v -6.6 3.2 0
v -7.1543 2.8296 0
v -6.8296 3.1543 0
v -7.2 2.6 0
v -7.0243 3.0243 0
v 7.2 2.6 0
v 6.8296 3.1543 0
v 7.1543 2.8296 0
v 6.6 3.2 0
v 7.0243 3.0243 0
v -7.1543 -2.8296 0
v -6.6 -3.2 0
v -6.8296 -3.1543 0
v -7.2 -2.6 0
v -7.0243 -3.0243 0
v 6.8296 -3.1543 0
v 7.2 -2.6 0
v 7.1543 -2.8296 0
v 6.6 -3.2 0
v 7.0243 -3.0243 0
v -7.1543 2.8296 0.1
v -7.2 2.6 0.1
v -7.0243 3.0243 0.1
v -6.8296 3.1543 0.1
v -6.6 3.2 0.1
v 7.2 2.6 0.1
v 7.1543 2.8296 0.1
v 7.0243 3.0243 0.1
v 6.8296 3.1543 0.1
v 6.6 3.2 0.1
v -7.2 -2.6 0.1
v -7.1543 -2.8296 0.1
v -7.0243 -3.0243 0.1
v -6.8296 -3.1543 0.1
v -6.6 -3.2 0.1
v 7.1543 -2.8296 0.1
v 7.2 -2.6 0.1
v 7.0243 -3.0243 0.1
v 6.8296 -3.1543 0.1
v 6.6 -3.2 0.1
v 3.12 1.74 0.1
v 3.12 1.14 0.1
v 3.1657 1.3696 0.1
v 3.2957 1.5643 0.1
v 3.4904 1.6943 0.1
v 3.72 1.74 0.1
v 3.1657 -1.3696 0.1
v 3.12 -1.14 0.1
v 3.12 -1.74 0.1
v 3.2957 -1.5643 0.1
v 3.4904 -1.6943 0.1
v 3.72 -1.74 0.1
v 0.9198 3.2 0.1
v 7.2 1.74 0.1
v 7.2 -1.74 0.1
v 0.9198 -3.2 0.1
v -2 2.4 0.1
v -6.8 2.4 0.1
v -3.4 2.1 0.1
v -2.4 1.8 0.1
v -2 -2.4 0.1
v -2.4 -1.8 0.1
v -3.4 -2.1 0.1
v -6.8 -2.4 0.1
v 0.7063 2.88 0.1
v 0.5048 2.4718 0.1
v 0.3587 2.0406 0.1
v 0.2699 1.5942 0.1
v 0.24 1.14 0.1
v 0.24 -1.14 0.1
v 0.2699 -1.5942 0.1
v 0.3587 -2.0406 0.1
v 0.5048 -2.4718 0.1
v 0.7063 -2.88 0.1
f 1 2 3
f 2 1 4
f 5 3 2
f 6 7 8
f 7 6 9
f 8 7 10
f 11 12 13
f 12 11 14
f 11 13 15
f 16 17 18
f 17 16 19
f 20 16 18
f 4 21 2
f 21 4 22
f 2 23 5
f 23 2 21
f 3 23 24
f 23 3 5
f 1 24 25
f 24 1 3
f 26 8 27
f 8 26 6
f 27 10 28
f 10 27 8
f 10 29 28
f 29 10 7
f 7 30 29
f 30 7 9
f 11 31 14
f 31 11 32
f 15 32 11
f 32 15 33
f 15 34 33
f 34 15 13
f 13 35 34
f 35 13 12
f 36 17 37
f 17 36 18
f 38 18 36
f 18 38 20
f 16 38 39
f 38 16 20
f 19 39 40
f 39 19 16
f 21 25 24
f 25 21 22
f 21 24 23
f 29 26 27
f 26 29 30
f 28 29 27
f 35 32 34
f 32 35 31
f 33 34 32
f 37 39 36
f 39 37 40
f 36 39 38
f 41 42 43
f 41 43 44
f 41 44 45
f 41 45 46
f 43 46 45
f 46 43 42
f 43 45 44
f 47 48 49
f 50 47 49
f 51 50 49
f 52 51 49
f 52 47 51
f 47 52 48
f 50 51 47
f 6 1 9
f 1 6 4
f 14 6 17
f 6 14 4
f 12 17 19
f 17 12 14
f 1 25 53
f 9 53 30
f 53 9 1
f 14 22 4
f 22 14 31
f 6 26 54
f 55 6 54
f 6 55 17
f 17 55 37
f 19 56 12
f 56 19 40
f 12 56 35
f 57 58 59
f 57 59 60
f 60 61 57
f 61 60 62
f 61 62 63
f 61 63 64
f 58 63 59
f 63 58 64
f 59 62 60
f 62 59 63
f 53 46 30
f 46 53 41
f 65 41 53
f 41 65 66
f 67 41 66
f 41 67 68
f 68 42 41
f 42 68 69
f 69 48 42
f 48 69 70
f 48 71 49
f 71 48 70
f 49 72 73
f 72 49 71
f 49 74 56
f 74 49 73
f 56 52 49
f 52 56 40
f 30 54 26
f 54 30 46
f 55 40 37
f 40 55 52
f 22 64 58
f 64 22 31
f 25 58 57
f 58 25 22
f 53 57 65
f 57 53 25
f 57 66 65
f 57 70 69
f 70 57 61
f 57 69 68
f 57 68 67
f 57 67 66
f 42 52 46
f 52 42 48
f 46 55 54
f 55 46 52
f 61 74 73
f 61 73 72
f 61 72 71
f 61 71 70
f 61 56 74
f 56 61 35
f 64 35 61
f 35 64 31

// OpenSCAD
// file: ../p/1-4ndis.scad
use <../lib.scad>
function ldraw_lib__1_4ndis() = [
// 0 Disc Negative 0.25
// 0 Name: 1-4ndis.dat
// 0 Author: James Jessiman
// 0 !LDRAW_ORG Primitive UPDATE 2012-01
// 0 !LICENSE Licensed under CC BY 4.0 : see CAreadme.txt
// 
// 0 BFC CERTIFY CCW
  [0,"BFC","CERTIFY"],
  [0,"BFC","CCW"],
// 
// 0 !HISTORY 2002-03-23 [sbliss] Added BFC Statement
// 0 !HISTORY 2002-04-25 [PTadmin] Official Update 2002-02
// 0 !HISTORY 2007-06-22 [PTadmin] Header formatted for Contributor Agreement
// 0 !HISTORY 2008-07-01 [PTadmin] Official Update 2008-01
// 0 !HISTORY 2012-02-16 [Philo] Changed to CCW
// 0 !HISTORY 2012-03-30 [PTadmin] Official Update 2012-01
// 
// 
// 3 16 0.9239 0 0.3827 1 0 0 1 0 1
  [3,16,0.9239,0,0.3827,1,0,0,1,0,1],
// 3 16 0.7071 0 0.7071 0.9239 0 0.3827 1 0 1
  [3,16,0.7071,0,0.7071,0.9239,0,0.3827,1,0,1],
// 3 16 0.3827 0 0.9239 0.7071 0 0.7071 1 0 1
  [3,16,0.3827,0,0.9239,0.7071,0,0.7071,1,0,1],
// 3 16 0 0 1 0.3827 0 0.9239 1 0 1
  [3,16,0,0,1,0.3827,0,0.9239,1,0,1],
];
module ldraw_lib__1_4ndis(step=0, col=false, unit=2/5, alt=false, line=0.2, solid=!$preview)
    makepoly(ldraw_lib__1_4ndis(), step=step, col=col, unit=unit, alt=alt, line=line, solid=solid);
ldraw_lib__1_4ndis(line=0.2);
// file: ../p/1-4cyli.scad
use <../lib.scad>
function ldraw_lib__1_4cyli() = [
// 0 Cylinder 0.25
// 0 Name: 1-4cyli.dat
// 0 Author: James Jessiman
// 0 !LDRAW_ORG Primitive UPDATE 2012-01
// 0 !LICENSE Licensed under CC BY 4.0 : see CAreadme.txt
// 
// 0 BFC CERTIFY CCW
  [0,"BFC","CERTIFY"],
  [0,"BFC","CCW"],
// 
// 0 !HISTORY 2002-03-23 [sbliss] Added BFC statement.
// 0 !HISTORY 2002-04-25 [PTadmin] Official Update 2002-02
// 0 !HISTORY 2007-06-22 [PTadmin] Header formatted for Contributor Agreement
// 0 !HISTORY 2008-07-01 [PTadmin] Official Update 2008-01
// 0 !HISTORY 2012-02-16 [Philo] Changed to CCW
// 0 !HISTORY 2012-03-30 [PTadmin] Official Update 2012-01
// 
// 
// 4 16 1 1 0 0.9239 1 0.3827 0.9239 0 0.3827 1 0 0
  [4,16,1,1,0,0.9239,1,0.3827,0.9239,0,0.3827,1,0,0],
// 5 24 1 0 0 1 1 0 0.9239 0 0.3827 1 0 -1
  [5,24,1,0,0,1,1,0,0.9239,0,0.3827,1,0,-1],
// 4 16 0.9239 1 0.3827 0.7071 1 0.7071 0.7071 0 0.7071 0.9239 0 0.3827
  [4,16,0.9239,1,0.3827,0.7071,1,0.7071,0.7071,0,0.7071,0.9239,0,0.3827],
// 5 24 0.9239 0 0.3827 0.9239 1 0.3827 0.7071 0 0.7071 1 0 0
  [5,24,0.9239,0,0.3827,0.9239,1,0.3827,0.7071,0,0.7071,1,0,0],
// 4 16 0.7071 1 0.7071 0.3827 1 0.9239 0.3827 0 0.9239 0.7071 0 0.7071
  [4,16,0.7071,1,0.7071,0.3827,1,0.9239,0.3827,0,0.9239,0.7071,0,0.7071],
// 5 24 0.7071 0 0.7071 0.7071 1 0.7071 0.3827 0 0.9239 0.9239 0 0.3827
  [5,24,0.7071,0,0.7071,0.7071,1,0.7071,0.3827,0,0.9239,0.9239,0,0.3827],
// 4 16 0.3827 1 0.9239 0 1 1 0 0 1 0.3827 0 0.9239
  [4,16,0.3827,1,0.9239,0,1,1,0,0,1,0.3827,0,0.9239],
// 5 24 0.3827 0 0.9239 0.3827 1 0.9239 0 0 1 0.7071 0 0.7071
  [5,24,0.3827,0,0.9239,0.3827,1,0.9239,0,0,1,0.7071,0,0.7071],
// 5 24 0 0 1 0 1 1 0.3827 0 0.9239 -1 0 1
  [5,24,0,0,1,0,1,1,0.3827,0,0.9239,-1,0,1],
];
module ldraw_lib__1_4cyli(step=0, col=false, unit=2/5, alt=false, line=0.2, solid=!$preview)
    makepoly(ldraw_lib__1_4cyli(), step=step, col=col, unit=unit, alt=alt, line=line, solid=solid);
ldraw_lib__1_4cyli(line=0.2);
// file: ../p/1-4chrd.scad
use <../lib.scad>
function ldraw_lib__1_4chrd() = [
// 0 Chord 0.25
// 0 Name: 1-4chrd.dat
// 0 Author: Max Martin Richter [MMR1988]
// 0 !LDRAW_ORG Primitive UPDATE 2023-05
// 0 !LICENSE Licensed under CC BY 4.0 : see CAreadme.txt
// 
// 0 BFC CERTIFY CCW
  [0,"BFC","CERTIFY"],
  [0,"BFC","CCW"],
// 
// 0 !HISTORY 2004-04-22 [PTadmin] Official Update 2004-02
// 0 !HISTORY 2007-10-09 [PTadmin] Header formatted for Contributor Agreement
// 0 !HISTORY 2008-07-01 [PTadmin] Official Update 2008-01
// 0 !HISTORY 2012-08-02 [MMR1988] Re-creation with PrimGen2 and Rectifier
// 0 !HISTORY 2012-08-09 [PTadmin] Official Update 2012-02
// 0 !HISTORY 2023-10-27 [OrionP] Change author to MMR1988 from hafhead
// 0 !HISTORY 2023-10-31 [OrionP] Official Update 2023-05
// 
// 4 16 0.9239 0 0.3827 0.3827 0 0.9239 0 0 1 1 0 0
  [4,16,0.9239,0,0.3827,0.3827,0,0.9239,0,0,1,1,0,0],
// 3 16 0.7071 0 0.7071 0.3827 0 0.9239 0.9239 0 0.3827
  [3,16,0.7071,0,0.7071,0.3827,0,0.9239,0.9239,0,0.3827],
];
module ldraw_lib__1_4chrd(step=0, col=false, unit=2/5, alt=false, line=0.2, solid=!$preview)
    makepoly(ldraw_lib__1_4chrd(), step=step, col=col, unit=unit, alt=alt, line=line, solid=solid);
ldraw_lib__1_4chrd(line=0.2);
// main file
use <../lib.scad>
use <../p/1-4chrd.scad>
use <../p/1-4cyli.scad>
use <../p/1-4ndis.scad>
function ldraw_lib__6148328bi() = [
// 0 Sticker  0.8 x  1.8 with Dark Grey Lines on White Background (Needs Work)
// 0 Name: 6148328bi.dat
// 0 Author: Massimo Maso [Sirio]
// 0 !LDRAW_ORG Part UPDATE 2024-08
// 0 !LICENSE Licensed under CC BY 4.0 : see CAreadme.txt
// 
// 0 !HELP Needs work: halftone areas in the headlamp are simplified with dark grey faces
// 
// 0 BFC CERTIFY CCW
  [0,"BFC","CERTIFY"],
  [0,"BFC","CCW"],
// 
// 0 !KEYWORDS 919, Bricklink 75876stk01, Brickowl 852010, Hybrid, Pit Lane
// 0 !KEYWORDS Rebrickable 26357, set 75876, Speed Champions
// 
// 0 !HISTORY 2024-09-30 [OrionP] Official Update 2024-08
// 
// 
// 0 // Primitives
// 1 16 -16.5 0 6.5 -1.5 0 0 0 -1 0 0 0 1.5 1-4chrd.dat
  [1,16,-16.5,0,6.5,-1.5,0,0,0,-1,0,0,0,1.5, ldraw_lib__1_4chrd()],
// 1 16 16.5 0 6.5 1.5 0 0 0 -1 0 0 0 1.5 1-4chrd.dat
  [1,16,16.5,0,6.5,1.5,0,0,0,-1,0,0,0,1.5, ldraw_lib__1_4chrd()],
// 1 16 -16.5 0 -6.5 -1.5 0 0 0 -1 0 0 0 -1.5 1-4chrd.dat
  [1,16,-16.5,0,-6.5,-1.5,0,0,0,-1,0,0,0,-1.5, ldraw_lib__1_4chrd()],
// 1 16 16.5 0 -6.5 1.5 0 0 0 -1 0 0 0 -1.5 1-4chrd.dat
  [1,16,16.5,0,-6.5,1.5,0,0,0,-1,0,0,0,-1.5, ldraw_lib__1_4chrd()],
// 1 16 -16.5 0 6.5 -1.5 0 0 0 -.25 0 0 0 1.5 1-4cyli.dat
  [1,16,-16.5,0,6.5,-1.5,0,0,0,-.25,0,0,0,1.5, ldraw_lib__1_4cyli()],
// 1 16 16.5 0 6.5 1.5 0 0 0 -.25 0 0 0 1.5 1-4cyli.dat
  [1,16,16.5,0,6.5,1.5,0,0,0,-.25,0,0,0,1.5, ldraw_lib__1_4cyli()],
// 1 16 -16.5 0 -6.5 -1.5 0 0 0 -.25 0 0 0 -1.5 1-4cyli.dat
  [1,16,-16.5,0,-6.5,-1.5,0,0,0,-.25,0,0,0,-1.5, ldraw_lib__1_4cyli()],
// 1 16 16.5 0 -6.5 1.5 0 0 0 -.25 0 0 0 -1.5 1-4cyli.dat
  [1,16,16.5,0,-6.5,1.5,0,0,0,-.25,0,0,0,-1.5, ldraw_lib__1_4cyli()],
// 1 15 -16.5 -.25 6.5 -1.5 0 0 0 1 0 0 0 1.5 1-4chrd.dat
  [1,15,-16.5,-.25,6.5,-1.5,0,0,0,1,0,0,0,1.5, ldraw_lib__1_4chrd()],
// 1 72 16.5 -.25 6.5 1.5 0 0 0 1 0 0 0 1.5 1-4chrd.dat
  [1,72,16.5,-.25,6.5,1.5,0,0,0,1,0,0,0,1.5, ldraw_lib__1_4chrd()],
// 1 15 -16.5 -.25 -6.5 -1.5 0 0 0 1 0 0 0 -1.5 1-4chrd.dat
  [1,15,-16.5,-.25,-6.5,-1.5,0,0,0,1,0,0,0,-1.5, ldraw_lib__1_4chrd()],
// 1 72 16.5 -.25 -6.5 1.5 0 0 0 1 0 0 0 -1.5 1-4chrd.dat
  [1,72,16.5,-.25,-6.5,1.5,0,0,0,1,0,0,0,-1.5, ldraw_lib__1_4chrd()],
// 1 72 9.3 -.25 2.85 -1.5 0 0 0 1 0 0 0 1.5 1-4ndis.dat
  [1,72,9.3,-.25,2.85,-1.5,0,0,0,1,0,0,0,1.5, ldraw_lib__1_4ndis()],
// 1 15 9.3 -.25 2.85 -1.5 0 0 0 1 0 0 0 1.5 1-4chrd.dat
  [1,15,9.3,-.25,2.85,-1.5,0,0,0,1,0,0,0,1.5, ldraw_lib__1_4chrd()],
// 1 72 9.3 -.25 -2.85 -1.5 0 0 0 1 0 0 0 -1.5 1-4ndis.dat
  [1,72,9.3,-.25,-2.85,-1.5,0,0,0,1,0,0,0,-1.5, ldraw_lib__1_4ndis()],
// 1 15 9.3 -.25 -2.85 -1.5 0 0 0 1 0 0 0 -1.5 1-4chrd.dat
  [1,15,9.3,-.25,-2.85,-1.5,0,0,0,1,0,0,0,-1.5, ldraw_lib__1_4chrd()],
// 0 // Bottom faces
// 4 16 16.5 0 8 18 0 6.5 -18 0 6.5 -16.5 0 8
  [4,16,16.5,0,8,18,0,6.5,-18,0,6.5,-16.5,0,8],
// 4 16 18 0 6.5 18 0 -6.5 -18 0 -6.5 -18 0 6.5
  [4,16,18,0,6.5,18,0,-6.5,-18,0,-6.5,-18,0,6.5],
// 4 16 16.5 0 -8 -16.5 0 -8 -18 0 -6.5 18 0 -6.5
  [4,16,16.5,0,-8,-16.5,0,-8,-18,0,-6.5,18,0,-6.5],
// 0 // Lateral faces
// 3 16 -16.5 0 8 -16.5 -.25 8 2.2996 -.25 8
  [3,16,-16.5,0,8,-16.5,-.25,8,2.2996,-.25,8],
// 4 16 -16.5 0 8 2.2996 -.25 8 16.5 -.25 8 16.5 0 8
  [4,16,-16.5,0,8,2.2996,-.25,8,16.5,-.25,8,16.5,0,8],
// 4 16 -18 0 6.5 -18 0 -6.5 -18 -.25 -6.5 -18 -.25 6.5
  [4,16,-18,0,6.5,-18,0,-6.5,-18,-.25,-6.5,-18,-.25,6.5],
// 3 16 18 0 6.5 18 -.25 6.5 18 -.25 4.35
  [3,16,18,0,6.5,18,-.25,6.5,18,-.25,4.35],
// 4 16 18 0 6.5 18 -.25 4.35 18 -.25 -4.35 18 0 -6.5
  [4,16,18,0,6.5,18,-.25,4.35,18,-.25,-4.35,18,0,-6.5],
// 3 16 18 0 -6.5 18 -.25 -4.35 18 -.25 -6.5
  [3,16,18,0,-6.5,18,-.25,-4.35,18,-.25,-6.5],
// 4 16 -16.5 0 -8 16.5 0 -8 16.5 -.25 -8 2.2996 -.25 -8
  [4,16,-16.5,0,-8,16.5,0,-8,16.5,-.25,-8,2.2996,-.25,-8],
// 3 16 -16.5 0 -8 2.2996 -.25 -8 -16.5 -.25 -8
  [3,16,-16.5,0,-8,2.2996,-.25,-8,-16.5,-.25,-8],
// 0 // Top faces
// 0 // Black faces
// 3 0 -5 -.25 6 -17 -.25 6 -8.5 -.25 5.25
  [3,0,-5,-.25,6,-17,-.25,6,-8.5,-.25,5.25],
// 3 0 -5 -.25 6 -8.5 -.25 5.25 -6 -.25 4.5
  [3,0,-5,-.25,6,-8.5,-.25,5.25,-6,-.25,4.5],
// 4 0 -5 -.25 6 -6 -.25 4.5 -6 -.25 -4.5 -5 -.25 -6
  [4,0,-5,-.25,6,-6,-.25,4.5,-6,-.25,-4.5,-5,-.25,-6],
// 3 0 -5 -.25 -6 -6 -.25 -4.5 -8.5 -.25 -5.25
  [3,0,-5,-.25,-6,-6,-.25,-4.5,-8.5,-.25,-5.25],
// 3 0 -5 -.25 -6 -8.5 -.25 -5.25 -17 -.25 -6
  [3,0,-5,-.25,-6,-8.5,-.25,-5.25,-17,-.25,-6],
// 0 // Dark grey faces (actually halftone of ndis 15 and disc 0)
// 4 72 -8.5 -.25 5.25 -17 -.25 6 -17 -.25 -6 -8.5 -.25 -5.25
  [4,72,-8.5,-.25,5.25,-17,-.25,6,-17,-.25,-6,-8.5,-.25,-5.25],
// 4 72 -8.5 -.25 5.25 -8.5 -.25 -5.25 -6 -.25 -4.5 -6 -.25 4.5
  [4,72,-8.5,-.25,5.25,-8.5,-.25,-5.25,-6,-.25,-4.5,-6,-.25,4.5],
// 0 // Dark grey faces
// 4 72 7.8 -.25 4.35 9.3 -.25 4.35 16.5 -.25 8 2.2996 -.25 8
  [4,72,7.8,-.25,4.35,9.3,-.25,4.35,16.5,-.25,8,2.2996,-.25,8],
// 4 72 7.8 -.25 4.35 2.2996 -.25 8 1.7658 -.25 7.2 1.2621 -.25 6.1795
  [4,72,7.8,-.25,4.35,2.2996,-.25,8,1.7658,-.25,7.2,1.2621,-.25,6.1795],
// 4 72 7.8 -.25 4.35 1.2621 -.25 6.1795 .8967 -.25 5.1016 .6748 -.25 3.9854
  [4,72,7.8,-.25,4.35,1.2621,-.25,6.1795,.8967,-.25,5.1016,.6748,-.25,3.9854],
// 4 72 7.8 -.25 4.35 .6748 -.25 3.9854 .6 -.25 2.85 7.8 -.25 2.85
  [4,72,7.8,-.25,4.35,.6748,-.25,3.9854,.6,-.25,2.85,7.8,-.25,2.85],
// 4 72 .6 -.25 2.85 .6 -.25 -2.85 7.8 -.25 -2.85 7.8 -.25 2.85
  [4,72,.6,-.25,2.85,.6,-.25,-2.85,7.8,-.25,-2.85,7.8,-.25,2.85],
// 4 72 7.8 -.25 -4.35 7.8 -.25 -2.85 .6 -.25 -2.85 .6748 -.25 -3.9854
  [4,72,7.8,-.25,-4.35,7.8,-.25,-2.85,.6,-.25,-2.85,.6748,-.25,-3.9854],
// 4 72 7.8 -.25 -4.35 .6748 -.25 -3.9854 .8967 -.25 -5.1016 1.2621 -.25 -6.1795
  [4,72,7.8,-.25,-4.35,.6748,-.25,-3.9854,.8967,-.25,-5.1016,1.2621,-.25,-6.1795],
// 4 72 7.8 -.25 -4.35 1.2621 -.25 -6.1795 1.7658 -.25 -7.2 2.2996 -.25 -8
  [4,72,7.8,-.25,-4.35,1.2621,-.25,-6.1795,1.7658,-.25,-7.2,2.2996,-.25,-8],
// 4 72 7.8 -.25 -4.35 2.2996 -.25 -8 16.5 -.25 -8 9.3 -.25 -4.35
  [4,72,7.8,-.25,-4.35,2.2996,-.25,-8,16.5,-.25,-8,9.3,-.25,-4.35],
// 4 72 9.3 -.25 4.35 18 -.25 4.35 18 -.25 6.5 16.5 -.25 8
  [4,72,9.3,-.25,4.35,18,-.25,4.35,18,-.25,6.5,16.5,-.25,8],
// 4 72 9.3 -.25 -4.35 16.5 -.25 -8 18 -.25 -6.5 18 -.25 -4.35
  [4,72,9.3,-.25,-4.35,16.5,-.25,-8,18,-.25,-6.5,18,-.25,-4.35],
// 0 // White faces
// 4 15 -17 -.25 6 -18 -.25 6.5 -18 -.25 -6.5 -17 -.25 -6
  [4,15,-17,-.25,6,-18,-.25,6.5,-18,-.25,-6.5,-17,-.25,-6],
// 4 15 -16.5 -.25 8 -18 -.25 6.5 -17 -.25 6 -5 -.25 6
  [4,15,-16.5,-.25,8,-18,-.25,6.5,-17,-.25,6,-5,-.25,6],
// 4 15 -5 -.25 6 1.7658 -.25 7.2 2.2996 -.25 8 -16.5 -.25 8
  [4,15,-5,-.25,6,1.7658,-.25,7.2,2.2996,-.25,8,-16.5,-.25,8],
// 3 15 -5 -.25 6 1.2621 -.25 6.1795 1.7658 -.25 7.2
  [3,15,-5,-.25,6,1.2621,-.25,6.1795,1.7658,-.25,7.2],
// 4 15 -5 -.25 6 -5 -.25 -6 .6 -.25 -2.85 .6 -.25 2.85
  [4,15,-5,-.25,6,-5,-.25,-6,.6,-.25,-2.85,.6,-.25,2.85],
// 3 15 -5 -.25 6 .6 -.25 2.85 .6748 -.25 3.9854
  [3,15,-5,-.25,6,.6,-.25,2.85,.6748,-.25,3.9854],
// 3 15 -5 -.25 6 .6748 -.25 3.9854 .8967 -.25 5.1016
  [3,15,-5,-.25,6,.6748,-.25,3.9854,.8967,-.25,5.1016],
// 3 15 -5 -.25 6 .8967 -.25 5.1016 1.2621 -.25 6.1795
  [3,15,-5,-.25,6,.8967,-.25,5.1016,1.2621,-.25,6.1795],
// 4 15 9.3 -.25 4.35 7.8 -.25 2.85 7.8 -.25 -2.85 9.3 -.25 -4.35
  [4,15,9.3,-.25,4.35,7.8,-.25,2.85,7.8,-.25,-2.85,9.3,-.25,-4.35],
// 4 15 9.3 -.25 4.35 9.3 -.25 -4.35 18 -.25 -4.35 18 -.25 4.35
  [4,15,9.3,-.25,4.35,9.3,-.25,-4.35,18,-.25,-4.35,18,-.25,4.35],
// 3 15 -5 -.25 -6 1.7658 -.25 -7.2 1.2621 -.25 -6.1795
  [3,15,-5,-.25,-6,1.7658,-.25,-7.2,1.2621,-.25,-6.1795],
// 3 15 -5 -.25 -6 1.2621 -.25 -6.1795 .8967 -.25 -5.1016
  [3,15,-5,-.25,-6,1.2621,-.25,-6.1795,.8967,-.25,-5.1016],
// 3 15 -5 -.25 -6 .8967 -.25 -5.1016 .6748 -.25 -3.9854
  [3,15,-5,-.25,-6,.8967,-.25,-5.1016,.6748,-.25,-3.9854],
// 3 15 -5 -.25 -6 .6748 -.25 -3.9854 .6 -.25 -2.85
  [3,15,-5,-.25,-6,.6748,-.25,-3.9854,.6,-.25,-2.85],
// 4 15 -5 -.25 -6 -16.5 -.25 -8 2.2996 -.25 -8 1.7658 -.25 -7.2
  [4,15,-5,-.25,-6,-16.5,-.25,-8,2.2996,-.25,-8,1.7658,-.25,-7.2],
// 4 15 -5 -.25 -6 -17 -.25 -6 -18 -.25 -6.5 -16.5 -.25 -8
  [4,15,-5,-.25,-6,-17,-.25,-6,-18,-.25,-6.5,-16.5,-.25,-8],
];
module ldraw_lib__6148328bi(step=0, col=false, unit=2/5, alt=false, line=0.2, solid=!$preview)
    makepoly(ldraw_lib__6148328bi(), step=step, col=col, unit=unit, alt=alt, line=line, solid=solid);
ldraw_lib__6148328bi(line=0.2);
